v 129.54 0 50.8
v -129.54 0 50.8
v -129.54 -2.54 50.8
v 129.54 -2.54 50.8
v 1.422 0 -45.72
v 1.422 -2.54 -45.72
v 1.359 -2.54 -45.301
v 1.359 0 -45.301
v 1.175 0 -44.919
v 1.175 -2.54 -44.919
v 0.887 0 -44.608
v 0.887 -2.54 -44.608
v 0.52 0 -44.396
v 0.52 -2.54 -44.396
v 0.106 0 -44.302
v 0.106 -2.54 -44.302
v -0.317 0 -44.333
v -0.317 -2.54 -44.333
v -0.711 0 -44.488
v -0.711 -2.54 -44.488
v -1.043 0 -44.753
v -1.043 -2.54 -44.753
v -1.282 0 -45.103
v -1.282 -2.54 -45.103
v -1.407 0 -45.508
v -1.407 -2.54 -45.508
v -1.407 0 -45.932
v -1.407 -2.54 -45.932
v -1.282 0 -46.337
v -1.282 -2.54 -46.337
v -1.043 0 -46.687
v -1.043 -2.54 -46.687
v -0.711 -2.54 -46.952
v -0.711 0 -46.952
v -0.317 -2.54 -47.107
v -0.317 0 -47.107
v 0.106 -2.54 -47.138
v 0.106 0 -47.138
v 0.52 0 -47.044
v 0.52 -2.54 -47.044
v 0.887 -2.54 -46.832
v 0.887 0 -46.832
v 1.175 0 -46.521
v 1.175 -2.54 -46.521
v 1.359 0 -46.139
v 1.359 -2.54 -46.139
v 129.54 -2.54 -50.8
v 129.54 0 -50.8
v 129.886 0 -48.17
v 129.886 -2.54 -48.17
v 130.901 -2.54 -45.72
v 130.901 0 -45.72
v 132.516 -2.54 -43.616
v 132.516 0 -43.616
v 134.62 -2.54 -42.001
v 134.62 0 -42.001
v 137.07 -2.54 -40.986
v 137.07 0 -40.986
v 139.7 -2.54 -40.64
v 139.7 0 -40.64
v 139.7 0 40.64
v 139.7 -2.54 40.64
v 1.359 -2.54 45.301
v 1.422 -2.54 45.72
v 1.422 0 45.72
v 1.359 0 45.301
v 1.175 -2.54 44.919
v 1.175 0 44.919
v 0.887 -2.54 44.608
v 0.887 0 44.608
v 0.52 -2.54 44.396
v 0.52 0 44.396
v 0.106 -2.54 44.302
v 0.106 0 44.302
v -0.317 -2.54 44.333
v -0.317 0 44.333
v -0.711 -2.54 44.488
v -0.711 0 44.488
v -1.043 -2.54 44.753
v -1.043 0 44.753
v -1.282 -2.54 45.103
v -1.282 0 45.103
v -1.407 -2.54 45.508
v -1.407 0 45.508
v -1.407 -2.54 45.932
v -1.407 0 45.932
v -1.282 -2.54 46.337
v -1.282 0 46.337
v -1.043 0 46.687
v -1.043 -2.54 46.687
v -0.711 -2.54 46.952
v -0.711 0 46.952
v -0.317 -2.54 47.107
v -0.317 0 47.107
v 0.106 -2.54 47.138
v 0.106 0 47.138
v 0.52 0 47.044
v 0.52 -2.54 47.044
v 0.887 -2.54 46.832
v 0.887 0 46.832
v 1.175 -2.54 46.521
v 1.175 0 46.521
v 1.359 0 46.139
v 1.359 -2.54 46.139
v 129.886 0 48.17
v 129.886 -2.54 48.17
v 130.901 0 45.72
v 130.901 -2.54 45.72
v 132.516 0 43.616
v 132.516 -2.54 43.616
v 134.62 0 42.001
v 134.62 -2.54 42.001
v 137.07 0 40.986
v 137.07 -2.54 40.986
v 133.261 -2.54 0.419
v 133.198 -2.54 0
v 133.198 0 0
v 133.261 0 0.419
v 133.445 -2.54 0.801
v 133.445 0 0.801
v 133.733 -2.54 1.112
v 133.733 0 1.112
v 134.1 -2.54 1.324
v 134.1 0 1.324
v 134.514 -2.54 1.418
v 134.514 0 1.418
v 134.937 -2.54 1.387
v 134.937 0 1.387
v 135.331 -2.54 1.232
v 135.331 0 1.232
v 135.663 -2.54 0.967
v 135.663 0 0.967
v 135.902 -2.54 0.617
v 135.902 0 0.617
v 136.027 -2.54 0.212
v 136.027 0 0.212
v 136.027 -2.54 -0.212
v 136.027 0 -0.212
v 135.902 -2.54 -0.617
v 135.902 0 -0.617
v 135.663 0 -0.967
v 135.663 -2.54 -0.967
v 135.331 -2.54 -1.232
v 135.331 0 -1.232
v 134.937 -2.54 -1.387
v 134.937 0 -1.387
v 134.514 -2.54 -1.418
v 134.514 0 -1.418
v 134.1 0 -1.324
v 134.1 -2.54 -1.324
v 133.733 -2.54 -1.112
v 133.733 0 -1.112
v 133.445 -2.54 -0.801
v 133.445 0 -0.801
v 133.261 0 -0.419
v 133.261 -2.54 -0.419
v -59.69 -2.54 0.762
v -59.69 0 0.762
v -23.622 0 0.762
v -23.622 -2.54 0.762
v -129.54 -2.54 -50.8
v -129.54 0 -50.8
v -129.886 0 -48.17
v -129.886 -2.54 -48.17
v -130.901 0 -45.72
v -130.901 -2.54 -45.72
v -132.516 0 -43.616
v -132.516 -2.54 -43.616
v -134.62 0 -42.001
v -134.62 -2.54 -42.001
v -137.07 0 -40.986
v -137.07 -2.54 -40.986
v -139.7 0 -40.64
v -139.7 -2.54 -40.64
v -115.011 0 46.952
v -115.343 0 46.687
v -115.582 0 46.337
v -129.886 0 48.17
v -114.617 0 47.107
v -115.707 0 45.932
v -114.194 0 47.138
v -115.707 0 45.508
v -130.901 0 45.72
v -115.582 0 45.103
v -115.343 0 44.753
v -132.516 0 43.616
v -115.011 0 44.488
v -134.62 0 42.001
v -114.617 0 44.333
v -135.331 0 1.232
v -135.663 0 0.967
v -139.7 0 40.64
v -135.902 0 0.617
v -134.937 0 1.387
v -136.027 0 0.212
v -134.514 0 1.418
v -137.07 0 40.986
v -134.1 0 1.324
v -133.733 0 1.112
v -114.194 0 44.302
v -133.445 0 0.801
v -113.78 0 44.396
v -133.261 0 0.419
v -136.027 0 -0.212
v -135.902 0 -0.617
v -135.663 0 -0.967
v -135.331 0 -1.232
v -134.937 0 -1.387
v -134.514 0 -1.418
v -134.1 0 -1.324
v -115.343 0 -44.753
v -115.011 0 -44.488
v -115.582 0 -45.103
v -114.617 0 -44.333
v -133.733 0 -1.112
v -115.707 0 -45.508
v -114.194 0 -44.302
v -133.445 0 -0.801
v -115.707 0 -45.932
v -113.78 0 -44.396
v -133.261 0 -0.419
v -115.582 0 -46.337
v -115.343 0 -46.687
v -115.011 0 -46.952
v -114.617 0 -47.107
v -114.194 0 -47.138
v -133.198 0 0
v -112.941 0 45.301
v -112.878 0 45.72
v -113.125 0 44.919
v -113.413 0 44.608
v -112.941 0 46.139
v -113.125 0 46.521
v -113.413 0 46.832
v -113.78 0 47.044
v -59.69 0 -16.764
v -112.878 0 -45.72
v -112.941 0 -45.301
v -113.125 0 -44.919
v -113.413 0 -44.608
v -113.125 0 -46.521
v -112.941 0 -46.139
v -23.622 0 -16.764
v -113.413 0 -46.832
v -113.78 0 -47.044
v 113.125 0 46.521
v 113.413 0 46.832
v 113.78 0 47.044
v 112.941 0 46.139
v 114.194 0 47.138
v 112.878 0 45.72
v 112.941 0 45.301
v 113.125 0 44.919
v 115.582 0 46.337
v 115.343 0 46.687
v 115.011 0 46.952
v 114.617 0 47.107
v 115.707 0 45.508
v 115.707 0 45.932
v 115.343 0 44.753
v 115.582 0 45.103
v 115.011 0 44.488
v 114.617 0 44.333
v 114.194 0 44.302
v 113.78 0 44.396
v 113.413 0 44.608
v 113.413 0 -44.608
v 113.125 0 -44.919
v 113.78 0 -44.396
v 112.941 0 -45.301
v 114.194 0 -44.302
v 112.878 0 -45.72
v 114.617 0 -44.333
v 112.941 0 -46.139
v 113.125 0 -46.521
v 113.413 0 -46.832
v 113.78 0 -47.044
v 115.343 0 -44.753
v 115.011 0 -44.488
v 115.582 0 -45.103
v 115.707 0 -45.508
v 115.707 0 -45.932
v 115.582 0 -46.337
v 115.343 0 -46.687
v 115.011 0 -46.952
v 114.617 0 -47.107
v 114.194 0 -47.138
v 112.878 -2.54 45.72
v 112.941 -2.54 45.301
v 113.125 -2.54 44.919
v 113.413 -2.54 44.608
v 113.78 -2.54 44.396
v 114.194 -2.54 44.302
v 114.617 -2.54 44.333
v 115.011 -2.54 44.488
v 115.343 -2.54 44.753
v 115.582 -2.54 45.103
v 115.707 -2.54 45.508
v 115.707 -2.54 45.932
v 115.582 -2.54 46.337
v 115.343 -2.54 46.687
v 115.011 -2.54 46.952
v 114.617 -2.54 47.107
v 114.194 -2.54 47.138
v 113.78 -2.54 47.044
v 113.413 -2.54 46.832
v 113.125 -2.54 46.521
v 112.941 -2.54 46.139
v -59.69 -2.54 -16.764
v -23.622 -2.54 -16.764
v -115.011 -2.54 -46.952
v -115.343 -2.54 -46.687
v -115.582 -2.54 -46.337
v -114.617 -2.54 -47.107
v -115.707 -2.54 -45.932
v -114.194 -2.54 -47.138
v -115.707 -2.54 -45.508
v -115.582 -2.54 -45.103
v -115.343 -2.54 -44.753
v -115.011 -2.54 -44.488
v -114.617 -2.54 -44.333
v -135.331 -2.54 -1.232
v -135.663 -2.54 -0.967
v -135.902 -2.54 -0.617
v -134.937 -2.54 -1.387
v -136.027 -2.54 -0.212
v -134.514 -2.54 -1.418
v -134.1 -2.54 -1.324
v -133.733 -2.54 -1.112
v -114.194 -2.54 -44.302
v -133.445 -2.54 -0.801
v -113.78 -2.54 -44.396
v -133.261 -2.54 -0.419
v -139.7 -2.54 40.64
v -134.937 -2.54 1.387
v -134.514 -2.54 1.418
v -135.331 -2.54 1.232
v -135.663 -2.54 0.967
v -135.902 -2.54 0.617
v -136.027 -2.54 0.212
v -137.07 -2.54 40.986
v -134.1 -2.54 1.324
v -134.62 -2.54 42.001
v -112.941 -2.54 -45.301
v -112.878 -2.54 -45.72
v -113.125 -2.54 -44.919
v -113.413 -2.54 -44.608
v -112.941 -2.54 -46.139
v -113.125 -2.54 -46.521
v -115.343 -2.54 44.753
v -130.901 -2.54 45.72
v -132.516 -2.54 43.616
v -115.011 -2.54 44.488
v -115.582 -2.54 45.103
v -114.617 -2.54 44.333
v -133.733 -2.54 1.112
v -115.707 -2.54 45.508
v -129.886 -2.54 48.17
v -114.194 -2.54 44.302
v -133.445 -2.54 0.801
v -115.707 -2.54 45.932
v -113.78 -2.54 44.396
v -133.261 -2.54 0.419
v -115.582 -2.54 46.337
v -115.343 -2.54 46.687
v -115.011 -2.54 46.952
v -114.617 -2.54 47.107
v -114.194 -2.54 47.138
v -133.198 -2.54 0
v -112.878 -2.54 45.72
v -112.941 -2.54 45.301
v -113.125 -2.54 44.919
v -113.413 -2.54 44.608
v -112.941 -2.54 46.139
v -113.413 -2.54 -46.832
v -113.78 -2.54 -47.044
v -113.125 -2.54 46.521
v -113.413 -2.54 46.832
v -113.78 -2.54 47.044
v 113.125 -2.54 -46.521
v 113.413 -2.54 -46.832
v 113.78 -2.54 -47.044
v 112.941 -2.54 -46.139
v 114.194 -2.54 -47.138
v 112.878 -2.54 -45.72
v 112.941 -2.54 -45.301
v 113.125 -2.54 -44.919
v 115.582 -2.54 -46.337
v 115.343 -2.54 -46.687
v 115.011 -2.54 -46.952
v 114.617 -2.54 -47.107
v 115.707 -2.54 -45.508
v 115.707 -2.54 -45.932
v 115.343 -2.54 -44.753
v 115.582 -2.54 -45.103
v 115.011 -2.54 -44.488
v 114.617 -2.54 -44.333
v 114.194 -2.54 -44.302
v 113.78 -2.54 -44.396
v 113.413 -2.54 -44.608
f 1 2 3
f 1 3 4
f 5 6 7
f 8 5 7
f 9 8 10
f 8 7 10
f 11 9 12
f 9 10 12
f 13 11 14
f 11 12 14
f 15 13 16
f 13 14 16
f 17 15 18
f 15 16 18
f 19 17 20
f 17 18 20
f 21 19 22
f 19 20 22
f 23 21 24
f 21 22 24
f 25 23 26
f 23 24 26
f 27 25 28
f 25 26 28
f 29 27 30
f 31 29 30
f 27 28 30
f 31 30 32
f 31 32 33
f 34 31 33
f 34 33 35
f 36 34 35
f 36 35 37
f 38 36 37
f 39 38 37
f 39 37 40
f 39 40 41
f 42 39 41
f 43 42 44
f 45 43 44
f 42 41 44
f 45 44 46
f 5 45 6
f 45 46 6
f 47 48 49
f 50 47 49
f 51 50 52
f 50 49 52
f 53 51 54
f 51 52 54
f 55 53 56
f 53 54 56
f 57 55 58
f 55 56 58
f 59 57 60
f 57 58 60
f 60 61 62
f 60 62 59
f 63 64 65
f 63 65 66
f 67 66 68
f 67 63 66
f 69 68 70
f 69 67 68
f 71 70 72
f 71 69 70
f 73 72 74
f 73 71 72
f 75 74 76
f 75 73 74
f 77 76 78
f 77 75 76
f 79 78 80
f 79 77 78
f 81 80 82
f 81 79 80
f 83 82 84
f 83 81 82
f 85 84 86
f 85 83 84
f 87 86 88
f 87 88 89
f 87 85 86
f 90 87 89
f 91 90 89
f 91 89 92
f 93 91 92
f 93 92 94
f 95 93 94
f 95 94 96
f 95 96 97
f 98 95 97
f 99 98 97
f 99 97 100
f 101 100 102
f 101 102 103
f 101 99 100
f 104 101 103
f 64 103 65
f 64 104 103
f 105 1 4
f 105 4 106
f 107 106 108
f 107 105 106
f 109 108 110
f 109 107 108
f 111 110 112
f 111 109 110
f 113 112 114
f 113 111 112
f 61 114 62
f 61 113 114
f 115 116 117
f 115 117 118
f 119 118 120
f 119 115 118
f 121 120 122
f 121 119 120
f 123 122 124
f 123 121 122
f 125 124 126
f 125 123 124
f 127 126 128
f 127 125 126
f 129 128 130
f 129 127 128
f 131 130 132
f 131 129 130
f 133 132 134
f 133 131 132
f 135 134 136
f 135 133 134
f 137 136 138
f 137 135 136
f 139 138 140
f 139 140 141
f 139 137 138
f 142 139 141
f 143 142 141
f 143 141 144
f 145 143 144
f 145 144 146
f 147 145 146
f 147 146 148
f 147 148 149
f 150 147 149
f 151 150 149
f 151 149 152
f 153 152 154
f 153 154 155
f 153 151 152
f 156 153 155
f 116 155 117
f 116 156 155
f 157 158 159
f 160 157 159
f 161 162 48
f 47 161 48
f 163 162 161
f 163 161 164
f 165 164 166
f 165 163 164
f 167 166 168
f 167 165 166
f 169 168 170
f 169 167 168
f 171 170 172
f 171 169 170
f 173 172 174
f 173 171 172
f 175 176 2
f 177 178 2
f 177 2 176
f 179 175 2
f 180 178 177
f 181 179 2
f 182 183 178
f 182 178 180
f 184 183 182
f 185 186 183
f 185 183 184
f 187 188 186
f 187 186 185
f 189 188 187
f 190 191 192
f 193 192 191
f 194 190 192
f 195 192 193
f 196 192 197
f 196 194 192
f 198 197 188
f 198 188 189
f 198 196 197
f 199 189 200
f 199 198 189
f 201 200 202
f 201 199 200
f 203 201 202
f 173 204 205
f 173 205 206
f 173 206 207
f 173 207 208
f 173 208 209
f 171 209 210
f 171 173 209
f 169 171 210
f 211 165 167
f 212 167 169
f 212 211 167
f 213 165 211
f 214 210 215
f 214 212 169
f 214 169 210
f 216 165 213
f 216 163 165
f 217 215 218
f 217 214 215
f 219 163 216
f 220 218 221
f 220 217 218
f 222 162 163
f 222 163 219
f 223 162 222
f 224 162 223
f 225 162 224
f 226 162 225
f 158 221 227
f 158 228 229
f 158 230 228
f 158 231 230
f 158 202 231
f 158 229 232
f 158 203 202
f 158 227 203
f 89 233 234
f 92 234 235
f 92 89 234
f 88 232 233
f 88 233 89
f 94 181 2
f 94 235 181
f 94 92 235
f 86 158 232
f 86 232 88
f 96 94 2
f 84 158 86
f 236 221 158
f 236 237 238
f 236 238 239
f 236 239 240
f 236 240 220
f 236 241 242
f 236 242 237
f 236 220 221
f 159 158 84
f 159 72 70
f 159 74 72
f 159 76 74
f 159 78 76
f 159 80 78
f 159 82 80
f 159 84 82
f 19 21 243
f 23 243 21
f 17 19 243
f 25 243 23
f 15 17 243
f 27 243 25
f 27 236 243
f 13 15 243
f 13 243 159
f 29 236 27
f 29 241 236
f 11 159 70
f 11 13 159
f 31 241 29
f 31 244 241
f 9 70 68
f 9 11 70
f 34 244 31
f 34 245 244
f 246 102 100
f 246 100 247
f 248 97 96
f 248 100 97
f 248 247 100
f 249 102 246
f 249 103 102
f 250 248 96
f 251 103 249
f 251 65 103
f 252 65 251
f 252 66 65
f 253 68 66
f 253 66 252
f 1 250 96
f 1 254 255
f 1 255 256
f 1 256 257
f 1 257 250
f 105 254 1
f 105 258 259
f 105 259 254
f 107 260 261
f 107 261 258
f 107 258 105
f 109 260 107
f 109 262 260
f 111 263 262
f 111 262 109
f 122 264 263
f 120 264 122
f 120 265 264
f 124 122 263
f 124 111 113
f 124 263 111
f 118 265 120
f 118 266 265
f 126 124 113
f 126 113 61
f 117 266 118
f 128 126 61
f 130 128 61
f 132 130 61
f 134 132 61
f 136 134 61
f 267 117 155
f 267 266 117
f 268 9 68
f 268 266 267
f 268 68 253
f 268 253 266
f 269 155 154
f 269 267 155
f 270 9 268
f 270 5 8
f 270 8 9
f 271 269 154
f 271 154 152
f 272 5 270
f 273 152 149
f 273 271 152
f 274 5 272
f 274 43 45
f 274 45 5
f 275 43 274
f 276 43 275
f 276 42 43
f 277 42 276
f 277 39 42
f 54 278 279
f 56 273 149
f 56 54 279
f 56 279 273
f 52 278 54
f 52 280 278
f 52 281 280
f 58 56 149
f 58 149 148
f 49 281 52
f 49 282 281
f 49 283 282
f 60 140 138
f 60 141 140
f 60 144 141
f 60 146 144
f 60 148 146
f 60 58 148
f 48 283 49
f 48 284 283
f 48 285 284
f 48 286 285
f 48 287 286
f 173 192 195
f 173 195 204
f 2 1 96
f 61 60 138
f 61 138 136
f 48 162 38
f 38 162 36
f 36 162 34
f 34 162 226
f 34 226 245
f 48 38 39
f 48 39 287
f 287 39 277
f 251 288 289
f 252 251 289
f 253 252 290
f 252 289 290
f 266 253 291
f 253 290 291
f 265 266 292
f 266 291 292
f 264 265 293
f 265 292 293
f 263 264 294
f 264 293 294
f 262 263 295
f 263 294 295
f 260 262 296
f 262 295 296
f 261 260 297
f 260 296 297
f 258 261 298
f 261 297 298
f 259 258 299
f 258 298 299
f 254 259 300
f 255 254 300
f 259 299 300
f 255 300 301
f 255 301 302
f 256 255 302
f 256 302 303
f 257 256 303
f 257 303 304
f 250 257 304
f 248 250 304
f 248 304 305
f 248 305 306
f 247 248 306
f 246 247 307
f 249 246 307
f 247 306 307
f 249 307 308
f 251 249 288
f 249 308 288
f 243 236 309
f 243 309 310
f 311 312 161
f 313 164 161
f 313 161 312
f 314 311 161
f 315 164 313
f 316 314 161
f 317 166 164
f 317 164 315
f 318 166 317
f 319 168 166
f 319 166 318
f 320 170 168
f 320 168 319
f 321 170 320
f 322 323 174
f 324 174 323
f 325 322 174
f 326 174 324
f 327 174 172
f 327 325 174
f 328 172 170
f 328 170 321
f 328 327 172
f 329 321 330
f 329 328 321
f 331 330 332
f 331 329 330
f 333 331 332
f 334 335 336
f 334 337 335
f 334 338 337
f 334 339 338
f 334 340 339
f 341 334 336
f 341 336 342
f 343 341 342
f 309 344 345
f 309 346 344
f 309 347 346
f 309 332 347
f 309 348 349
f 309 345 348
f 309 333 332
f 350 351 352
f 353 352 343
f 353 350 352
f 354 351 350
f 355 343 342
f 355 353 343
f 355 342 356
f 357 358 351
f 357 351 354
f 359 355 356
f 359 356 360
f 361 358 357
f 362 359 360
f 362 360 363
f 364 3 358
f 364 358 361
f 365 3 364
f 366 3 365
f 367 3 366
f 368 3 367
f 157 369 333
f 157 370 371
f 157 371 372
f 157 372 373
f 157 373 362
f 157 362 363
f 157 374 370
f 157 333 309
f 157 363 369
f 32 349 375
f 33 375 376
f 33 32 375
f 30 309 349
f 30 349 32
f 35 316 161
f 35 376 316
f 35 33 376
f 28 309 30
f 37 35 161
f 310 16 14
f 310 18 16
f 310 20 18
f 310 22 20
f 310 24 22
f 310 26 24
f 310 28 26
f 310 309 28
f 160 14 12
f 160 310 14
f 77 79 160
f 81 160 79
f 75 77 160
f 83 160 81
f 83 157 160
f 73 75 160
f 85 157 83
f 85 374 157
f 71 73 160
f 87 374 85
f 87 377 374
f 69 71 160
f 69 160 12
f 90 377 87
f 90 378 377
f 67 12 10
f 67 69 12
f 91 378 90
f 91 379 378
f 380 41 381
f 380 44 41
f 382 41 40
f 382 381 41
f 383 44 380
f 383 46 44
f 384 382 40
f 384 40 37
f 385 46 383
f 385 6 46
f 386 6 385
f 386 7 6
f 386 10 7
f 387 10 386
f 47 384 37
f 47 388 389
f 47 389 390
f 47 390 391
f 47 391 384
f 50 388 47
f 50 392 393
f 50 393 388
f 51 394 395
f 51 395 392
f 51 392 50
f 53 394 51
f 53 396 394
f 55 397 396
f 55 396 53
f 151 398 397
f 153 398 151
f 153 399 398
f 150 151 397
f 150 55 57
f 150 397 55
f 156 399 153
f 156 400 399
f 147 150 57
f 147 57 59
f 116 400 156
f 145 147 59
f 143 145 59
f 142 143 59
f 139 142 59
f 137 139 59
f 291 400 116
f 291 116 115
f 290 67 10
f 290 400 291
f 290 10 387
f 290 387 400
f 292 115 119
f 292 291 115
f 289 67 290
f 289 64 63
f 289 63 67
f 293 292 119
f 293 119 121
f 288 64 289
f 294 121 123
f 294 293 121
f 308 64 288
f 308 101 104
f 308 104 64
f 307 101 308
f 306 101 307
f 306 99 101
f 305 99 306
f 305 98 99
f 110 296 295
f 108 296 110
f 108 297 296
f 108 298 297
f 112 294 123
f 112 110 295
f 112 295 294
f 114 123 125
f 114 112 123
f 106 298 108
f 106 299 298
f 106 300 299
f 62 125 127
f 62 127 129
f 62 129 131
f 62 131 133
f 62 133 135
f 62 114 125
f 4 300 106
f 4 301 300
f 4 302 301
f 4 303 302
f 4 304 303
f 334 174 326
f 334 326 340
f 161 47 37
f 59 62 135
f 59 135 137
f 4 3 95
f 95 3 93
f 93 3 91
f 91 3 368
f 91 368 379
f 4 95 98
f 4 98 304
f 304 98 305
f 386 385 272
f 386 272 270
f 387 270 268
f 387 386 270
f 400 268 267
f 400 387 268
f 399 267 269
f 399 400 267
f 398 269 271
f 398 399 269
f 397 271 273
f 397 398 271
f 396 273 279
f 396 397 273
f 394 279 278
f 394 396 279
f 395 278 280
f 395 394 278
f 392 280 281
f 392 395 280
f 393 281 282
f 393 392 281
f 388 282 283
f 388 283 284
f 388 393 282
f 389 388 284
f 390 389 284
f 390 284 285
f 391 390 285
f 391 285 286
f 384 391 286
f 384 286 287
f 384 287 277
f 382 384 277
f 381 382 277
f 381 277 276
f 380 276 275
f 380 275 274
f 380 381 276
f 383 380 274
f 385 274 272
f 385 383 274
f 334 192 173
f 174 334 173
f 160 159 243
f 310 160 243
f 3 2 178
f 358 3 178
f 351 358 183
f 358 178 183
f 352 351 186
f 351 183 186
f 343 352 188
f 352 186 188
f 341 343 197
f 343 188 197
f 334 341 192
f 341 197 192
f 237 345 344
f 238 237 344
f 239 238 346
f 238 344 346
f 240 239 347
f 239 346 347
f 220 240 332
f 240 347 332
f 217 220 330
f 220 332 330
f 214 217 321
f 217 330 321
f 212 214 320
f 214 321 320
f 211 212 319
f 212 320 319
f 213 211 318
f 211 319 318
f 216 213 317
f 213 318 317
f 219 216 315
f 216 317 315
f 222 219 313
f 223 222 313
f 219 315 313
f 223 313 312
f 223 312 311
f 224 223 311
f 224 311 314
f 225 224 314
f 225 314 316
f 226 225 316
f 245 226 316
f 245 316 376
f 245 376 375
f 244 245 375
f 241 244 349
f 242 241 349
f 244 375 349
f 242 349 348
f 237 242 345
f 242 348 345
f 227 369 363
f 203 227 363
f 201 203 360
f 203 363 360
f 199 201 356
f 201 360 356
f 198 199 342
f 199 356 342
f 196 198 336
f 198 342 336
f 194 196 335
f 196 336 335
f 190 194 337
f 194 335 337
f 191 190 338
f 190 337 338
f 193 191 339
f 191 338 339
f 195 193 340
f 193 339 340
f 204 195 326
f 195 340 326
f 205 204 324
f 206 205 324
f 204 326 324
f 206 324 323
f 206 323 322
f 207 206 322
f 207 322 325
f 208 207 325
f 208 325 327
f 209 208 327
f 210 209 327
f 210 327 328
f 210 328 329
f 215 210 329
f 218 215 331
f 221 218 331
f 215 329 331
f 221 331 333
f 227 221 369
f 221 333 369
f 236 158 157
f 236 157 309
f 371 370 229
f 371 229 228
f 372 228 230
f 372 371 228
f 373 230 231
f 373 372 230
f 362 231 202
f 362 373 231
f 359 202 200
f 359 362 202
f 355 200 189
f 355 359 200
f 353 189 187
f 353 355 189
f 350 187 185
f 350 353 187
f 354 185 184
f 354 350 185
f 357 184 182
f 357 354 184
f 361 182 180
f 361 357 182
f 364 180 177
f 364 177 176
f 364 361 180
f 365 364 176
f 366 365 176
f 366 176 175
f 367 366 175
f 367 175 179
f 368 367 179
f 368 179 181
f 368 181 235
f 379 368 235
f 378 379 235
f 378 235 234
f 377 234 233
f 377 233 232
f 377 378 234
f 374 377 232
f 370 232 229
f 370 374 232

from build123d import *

# Parameters (mm, degrees)
SKETCH3_W                                  = 279.4
SKETCH3_H                                  = 101.6
RECTANGLE_CUT_DEPTH                        = 5.08
SKETCH4_R                                  = 10.16
CUT_EXTRUDE2_DEPTH                         = 7.62
MIRROR3_COPY_1_SKETCH_R                    = 10.16
MIRROR3_COPY_1_DEPTH                       = 7.62
SKETCH6_W                                  = 36.068
SKETCH6_H                                  = 17.526
CUT_EXTRUDE3_DEPTH                         = 7.62
SKETCH9_W                                  = 329.627948334
SKETCH9_H                                  = 121.564544856
CUT_EXTRUDE5_DEPTH                         = 2.54
SKETCH11_R                                 = 1.4224
CUT_EXTRUDE6_DEPTH                         = 2.54
MIRROR4_AT_THE_SECOND_PLANE_COPY_1_SKETC_R = 1.4224
MIRROR4_AT_THE_SECOND_PLANE_COPY_1_DEPTH   = 2.54
SKETCH12_R                                 = 1.4224
CUT_EXTRUDE7_DEPTH                         = 2.54
SKETCH13_R                                 = 1.4224
CUT_EXTRUDE8_DEPTH                         = 2.54


with BuildPart() as part:
    # Sketch3 → Rectangle cut (new body)
    with BuildSketch(Plane(origin=(0, 0, 0), x_dir=(1, 0, 0), z_dir=(0, 1, 0))):
        Rectangle(SKETCH3_W, SKETCH3_H)
    extrude(amount=-RECTANGLE_CUT_DEPTH)

    # Sketch4 → Cut-Extrude2 (cut)
    with BuildSketch(Plane(origin=(0, 0, 0), x_dir=(1, 0, 0), z_dir=(0, 1, 0))):
        with Locations((-139.7, -50.8)):
            Circle(SKETCH4_R)
    cut_extrude2 = extrude(amount=-CUT_EXTRUDE2_DEPTH, mode=Mode.SUBTRACT)

    # mountingCorners: Cut-Extrude2 across plane
    add(cut_extrude2.mirror(Plane(origin=(0, 0, 0), x_dir=(0, 0, 1), z_dir=(1, 0, 0))), mode=Mode.SUBTRACT)

    # Mirror3: Cut-Extrude2 across plane
    add(cut_extrude2.mirror(Plane.XY), mode=Mode.SUBTRACT)

    # Mirror3 copy 1 sketch → Mirror3 copy 1 (cut)
    with BuildSketch(Plane(origin=(0, 0, 0), x_dir=(-1, 0, 0), z_dir=(0, 1, 0))):
        with Locations((-139.7, -50.8)):
            Circle(MIRROR3_COPY_1_SKETCH_R)
    extrude(amount=-MIRROR3_COPY_1_DEPTH, mode=Mode.SUBTRACT)

    # Sketch6 → Cut-Extrude3 (cut)
    with BuildSketch(Plane(origin=(0, 0, 0), x_dir=(1, 0, 0), z_dir=(0, 1, 0))):
        with Locations((-41.656, 8.001)):
            Rectangle(SKETCH6_W, SKETCH6_H)
    extrude(amount=-CUT_EXTRUDE3_DEPTH, mode=Mode.SUBTRACT)

    # Sketch9 → Cut-Extrude5 (cut)
    with BuildSketch(Plane.XZ.offset(5.08)):
        Rectangle(SKETCH9_W, SKETCH9_H)
    extrude(amount=-CUT_EXTRUDE5_DEPTH, mode=Mode.SUBTRACT)

    # Sketch11 → Cut-Extrude6 (cut)
    with BuildSketch(Plane.XZ.offset(2.54)):
        with Locations((-114.3, -45.72)):
            Circle(SKETCH11_R)
    cut_extrude6 = extrude(amount=-CUT_EXTRUDE6_DEPTH, mode=Mode.SUBTRACT)

    # Mirror4: Cut-Extrude6 across plane
    add(cut_extrude6.mirror(Plane.XY), mode=Mode.SUBTRACT)

    # Mirror4 at the second plane: Cut-Extrude6 across plane
    add(cut_extrude6.mirror(Plane(origin=(0, 0, 0), x_dir=(0, 0, 1), z_dir=(1, 0, 0))), mode=Mode.SUBTRACT)

    # Mirror4 at the second plane copy 1 sketc → Mirror4 at the second plane copy 1 (cut)
    with BuildSketch(Plane(origin=(0, -2.54, 0), x_dir=(-1, 0, 0), z_dir=(0, -1, 0))):
        with Locations((-114.3, -45.72)):
            Circle(MIRROR4_AT_THE_SECOND_PLANE_COPY_1_SKETC_R)
    extrude(amount=-MIRROR4_AT_THE_SECOND_PLANE_COPY_1_DEPTH, mode=Mode.SUBTRACT)

    # Sketch12 → Cut-Extrude7 (cut)
    with BuildSketch(Plane.XZ.offset(2.54)):
        with Locations((-134.62, 0)):
            Circle(SKETCH12_R)
    cut_extrude7 = extrude(amount=-CUT_EXTRUDE7_DEPTH, mode=Mode.SUBTRACT)

    # Mirror5: Cut-Extrude7 across plane
    add(cut_extrude7.mirror(Plane(origin=(0, 0, 0), x_dir=(0, 0, 1), z_dir=(1, 0, 0))), mode=Mode.SUBTRACT)

    # Sketch13 → Cut-Extrude8 (cut)
    with BuildSketch(Plane.XZ.offset(2.54)):
        with Locations((0, -45.72)):
            Circle(SKETCH13_R)
    cut_extrude8 = extrude(amount=-CUT_EXTRUDE8_DEPTH, mode=Mode.SUBTRACT)

    # Mirror6: Cut-Extrude8 across plane
    add(cut_extrude8.mirror(Plane.XY), mode=Mode.SUBTRACT)


solid = part.part
